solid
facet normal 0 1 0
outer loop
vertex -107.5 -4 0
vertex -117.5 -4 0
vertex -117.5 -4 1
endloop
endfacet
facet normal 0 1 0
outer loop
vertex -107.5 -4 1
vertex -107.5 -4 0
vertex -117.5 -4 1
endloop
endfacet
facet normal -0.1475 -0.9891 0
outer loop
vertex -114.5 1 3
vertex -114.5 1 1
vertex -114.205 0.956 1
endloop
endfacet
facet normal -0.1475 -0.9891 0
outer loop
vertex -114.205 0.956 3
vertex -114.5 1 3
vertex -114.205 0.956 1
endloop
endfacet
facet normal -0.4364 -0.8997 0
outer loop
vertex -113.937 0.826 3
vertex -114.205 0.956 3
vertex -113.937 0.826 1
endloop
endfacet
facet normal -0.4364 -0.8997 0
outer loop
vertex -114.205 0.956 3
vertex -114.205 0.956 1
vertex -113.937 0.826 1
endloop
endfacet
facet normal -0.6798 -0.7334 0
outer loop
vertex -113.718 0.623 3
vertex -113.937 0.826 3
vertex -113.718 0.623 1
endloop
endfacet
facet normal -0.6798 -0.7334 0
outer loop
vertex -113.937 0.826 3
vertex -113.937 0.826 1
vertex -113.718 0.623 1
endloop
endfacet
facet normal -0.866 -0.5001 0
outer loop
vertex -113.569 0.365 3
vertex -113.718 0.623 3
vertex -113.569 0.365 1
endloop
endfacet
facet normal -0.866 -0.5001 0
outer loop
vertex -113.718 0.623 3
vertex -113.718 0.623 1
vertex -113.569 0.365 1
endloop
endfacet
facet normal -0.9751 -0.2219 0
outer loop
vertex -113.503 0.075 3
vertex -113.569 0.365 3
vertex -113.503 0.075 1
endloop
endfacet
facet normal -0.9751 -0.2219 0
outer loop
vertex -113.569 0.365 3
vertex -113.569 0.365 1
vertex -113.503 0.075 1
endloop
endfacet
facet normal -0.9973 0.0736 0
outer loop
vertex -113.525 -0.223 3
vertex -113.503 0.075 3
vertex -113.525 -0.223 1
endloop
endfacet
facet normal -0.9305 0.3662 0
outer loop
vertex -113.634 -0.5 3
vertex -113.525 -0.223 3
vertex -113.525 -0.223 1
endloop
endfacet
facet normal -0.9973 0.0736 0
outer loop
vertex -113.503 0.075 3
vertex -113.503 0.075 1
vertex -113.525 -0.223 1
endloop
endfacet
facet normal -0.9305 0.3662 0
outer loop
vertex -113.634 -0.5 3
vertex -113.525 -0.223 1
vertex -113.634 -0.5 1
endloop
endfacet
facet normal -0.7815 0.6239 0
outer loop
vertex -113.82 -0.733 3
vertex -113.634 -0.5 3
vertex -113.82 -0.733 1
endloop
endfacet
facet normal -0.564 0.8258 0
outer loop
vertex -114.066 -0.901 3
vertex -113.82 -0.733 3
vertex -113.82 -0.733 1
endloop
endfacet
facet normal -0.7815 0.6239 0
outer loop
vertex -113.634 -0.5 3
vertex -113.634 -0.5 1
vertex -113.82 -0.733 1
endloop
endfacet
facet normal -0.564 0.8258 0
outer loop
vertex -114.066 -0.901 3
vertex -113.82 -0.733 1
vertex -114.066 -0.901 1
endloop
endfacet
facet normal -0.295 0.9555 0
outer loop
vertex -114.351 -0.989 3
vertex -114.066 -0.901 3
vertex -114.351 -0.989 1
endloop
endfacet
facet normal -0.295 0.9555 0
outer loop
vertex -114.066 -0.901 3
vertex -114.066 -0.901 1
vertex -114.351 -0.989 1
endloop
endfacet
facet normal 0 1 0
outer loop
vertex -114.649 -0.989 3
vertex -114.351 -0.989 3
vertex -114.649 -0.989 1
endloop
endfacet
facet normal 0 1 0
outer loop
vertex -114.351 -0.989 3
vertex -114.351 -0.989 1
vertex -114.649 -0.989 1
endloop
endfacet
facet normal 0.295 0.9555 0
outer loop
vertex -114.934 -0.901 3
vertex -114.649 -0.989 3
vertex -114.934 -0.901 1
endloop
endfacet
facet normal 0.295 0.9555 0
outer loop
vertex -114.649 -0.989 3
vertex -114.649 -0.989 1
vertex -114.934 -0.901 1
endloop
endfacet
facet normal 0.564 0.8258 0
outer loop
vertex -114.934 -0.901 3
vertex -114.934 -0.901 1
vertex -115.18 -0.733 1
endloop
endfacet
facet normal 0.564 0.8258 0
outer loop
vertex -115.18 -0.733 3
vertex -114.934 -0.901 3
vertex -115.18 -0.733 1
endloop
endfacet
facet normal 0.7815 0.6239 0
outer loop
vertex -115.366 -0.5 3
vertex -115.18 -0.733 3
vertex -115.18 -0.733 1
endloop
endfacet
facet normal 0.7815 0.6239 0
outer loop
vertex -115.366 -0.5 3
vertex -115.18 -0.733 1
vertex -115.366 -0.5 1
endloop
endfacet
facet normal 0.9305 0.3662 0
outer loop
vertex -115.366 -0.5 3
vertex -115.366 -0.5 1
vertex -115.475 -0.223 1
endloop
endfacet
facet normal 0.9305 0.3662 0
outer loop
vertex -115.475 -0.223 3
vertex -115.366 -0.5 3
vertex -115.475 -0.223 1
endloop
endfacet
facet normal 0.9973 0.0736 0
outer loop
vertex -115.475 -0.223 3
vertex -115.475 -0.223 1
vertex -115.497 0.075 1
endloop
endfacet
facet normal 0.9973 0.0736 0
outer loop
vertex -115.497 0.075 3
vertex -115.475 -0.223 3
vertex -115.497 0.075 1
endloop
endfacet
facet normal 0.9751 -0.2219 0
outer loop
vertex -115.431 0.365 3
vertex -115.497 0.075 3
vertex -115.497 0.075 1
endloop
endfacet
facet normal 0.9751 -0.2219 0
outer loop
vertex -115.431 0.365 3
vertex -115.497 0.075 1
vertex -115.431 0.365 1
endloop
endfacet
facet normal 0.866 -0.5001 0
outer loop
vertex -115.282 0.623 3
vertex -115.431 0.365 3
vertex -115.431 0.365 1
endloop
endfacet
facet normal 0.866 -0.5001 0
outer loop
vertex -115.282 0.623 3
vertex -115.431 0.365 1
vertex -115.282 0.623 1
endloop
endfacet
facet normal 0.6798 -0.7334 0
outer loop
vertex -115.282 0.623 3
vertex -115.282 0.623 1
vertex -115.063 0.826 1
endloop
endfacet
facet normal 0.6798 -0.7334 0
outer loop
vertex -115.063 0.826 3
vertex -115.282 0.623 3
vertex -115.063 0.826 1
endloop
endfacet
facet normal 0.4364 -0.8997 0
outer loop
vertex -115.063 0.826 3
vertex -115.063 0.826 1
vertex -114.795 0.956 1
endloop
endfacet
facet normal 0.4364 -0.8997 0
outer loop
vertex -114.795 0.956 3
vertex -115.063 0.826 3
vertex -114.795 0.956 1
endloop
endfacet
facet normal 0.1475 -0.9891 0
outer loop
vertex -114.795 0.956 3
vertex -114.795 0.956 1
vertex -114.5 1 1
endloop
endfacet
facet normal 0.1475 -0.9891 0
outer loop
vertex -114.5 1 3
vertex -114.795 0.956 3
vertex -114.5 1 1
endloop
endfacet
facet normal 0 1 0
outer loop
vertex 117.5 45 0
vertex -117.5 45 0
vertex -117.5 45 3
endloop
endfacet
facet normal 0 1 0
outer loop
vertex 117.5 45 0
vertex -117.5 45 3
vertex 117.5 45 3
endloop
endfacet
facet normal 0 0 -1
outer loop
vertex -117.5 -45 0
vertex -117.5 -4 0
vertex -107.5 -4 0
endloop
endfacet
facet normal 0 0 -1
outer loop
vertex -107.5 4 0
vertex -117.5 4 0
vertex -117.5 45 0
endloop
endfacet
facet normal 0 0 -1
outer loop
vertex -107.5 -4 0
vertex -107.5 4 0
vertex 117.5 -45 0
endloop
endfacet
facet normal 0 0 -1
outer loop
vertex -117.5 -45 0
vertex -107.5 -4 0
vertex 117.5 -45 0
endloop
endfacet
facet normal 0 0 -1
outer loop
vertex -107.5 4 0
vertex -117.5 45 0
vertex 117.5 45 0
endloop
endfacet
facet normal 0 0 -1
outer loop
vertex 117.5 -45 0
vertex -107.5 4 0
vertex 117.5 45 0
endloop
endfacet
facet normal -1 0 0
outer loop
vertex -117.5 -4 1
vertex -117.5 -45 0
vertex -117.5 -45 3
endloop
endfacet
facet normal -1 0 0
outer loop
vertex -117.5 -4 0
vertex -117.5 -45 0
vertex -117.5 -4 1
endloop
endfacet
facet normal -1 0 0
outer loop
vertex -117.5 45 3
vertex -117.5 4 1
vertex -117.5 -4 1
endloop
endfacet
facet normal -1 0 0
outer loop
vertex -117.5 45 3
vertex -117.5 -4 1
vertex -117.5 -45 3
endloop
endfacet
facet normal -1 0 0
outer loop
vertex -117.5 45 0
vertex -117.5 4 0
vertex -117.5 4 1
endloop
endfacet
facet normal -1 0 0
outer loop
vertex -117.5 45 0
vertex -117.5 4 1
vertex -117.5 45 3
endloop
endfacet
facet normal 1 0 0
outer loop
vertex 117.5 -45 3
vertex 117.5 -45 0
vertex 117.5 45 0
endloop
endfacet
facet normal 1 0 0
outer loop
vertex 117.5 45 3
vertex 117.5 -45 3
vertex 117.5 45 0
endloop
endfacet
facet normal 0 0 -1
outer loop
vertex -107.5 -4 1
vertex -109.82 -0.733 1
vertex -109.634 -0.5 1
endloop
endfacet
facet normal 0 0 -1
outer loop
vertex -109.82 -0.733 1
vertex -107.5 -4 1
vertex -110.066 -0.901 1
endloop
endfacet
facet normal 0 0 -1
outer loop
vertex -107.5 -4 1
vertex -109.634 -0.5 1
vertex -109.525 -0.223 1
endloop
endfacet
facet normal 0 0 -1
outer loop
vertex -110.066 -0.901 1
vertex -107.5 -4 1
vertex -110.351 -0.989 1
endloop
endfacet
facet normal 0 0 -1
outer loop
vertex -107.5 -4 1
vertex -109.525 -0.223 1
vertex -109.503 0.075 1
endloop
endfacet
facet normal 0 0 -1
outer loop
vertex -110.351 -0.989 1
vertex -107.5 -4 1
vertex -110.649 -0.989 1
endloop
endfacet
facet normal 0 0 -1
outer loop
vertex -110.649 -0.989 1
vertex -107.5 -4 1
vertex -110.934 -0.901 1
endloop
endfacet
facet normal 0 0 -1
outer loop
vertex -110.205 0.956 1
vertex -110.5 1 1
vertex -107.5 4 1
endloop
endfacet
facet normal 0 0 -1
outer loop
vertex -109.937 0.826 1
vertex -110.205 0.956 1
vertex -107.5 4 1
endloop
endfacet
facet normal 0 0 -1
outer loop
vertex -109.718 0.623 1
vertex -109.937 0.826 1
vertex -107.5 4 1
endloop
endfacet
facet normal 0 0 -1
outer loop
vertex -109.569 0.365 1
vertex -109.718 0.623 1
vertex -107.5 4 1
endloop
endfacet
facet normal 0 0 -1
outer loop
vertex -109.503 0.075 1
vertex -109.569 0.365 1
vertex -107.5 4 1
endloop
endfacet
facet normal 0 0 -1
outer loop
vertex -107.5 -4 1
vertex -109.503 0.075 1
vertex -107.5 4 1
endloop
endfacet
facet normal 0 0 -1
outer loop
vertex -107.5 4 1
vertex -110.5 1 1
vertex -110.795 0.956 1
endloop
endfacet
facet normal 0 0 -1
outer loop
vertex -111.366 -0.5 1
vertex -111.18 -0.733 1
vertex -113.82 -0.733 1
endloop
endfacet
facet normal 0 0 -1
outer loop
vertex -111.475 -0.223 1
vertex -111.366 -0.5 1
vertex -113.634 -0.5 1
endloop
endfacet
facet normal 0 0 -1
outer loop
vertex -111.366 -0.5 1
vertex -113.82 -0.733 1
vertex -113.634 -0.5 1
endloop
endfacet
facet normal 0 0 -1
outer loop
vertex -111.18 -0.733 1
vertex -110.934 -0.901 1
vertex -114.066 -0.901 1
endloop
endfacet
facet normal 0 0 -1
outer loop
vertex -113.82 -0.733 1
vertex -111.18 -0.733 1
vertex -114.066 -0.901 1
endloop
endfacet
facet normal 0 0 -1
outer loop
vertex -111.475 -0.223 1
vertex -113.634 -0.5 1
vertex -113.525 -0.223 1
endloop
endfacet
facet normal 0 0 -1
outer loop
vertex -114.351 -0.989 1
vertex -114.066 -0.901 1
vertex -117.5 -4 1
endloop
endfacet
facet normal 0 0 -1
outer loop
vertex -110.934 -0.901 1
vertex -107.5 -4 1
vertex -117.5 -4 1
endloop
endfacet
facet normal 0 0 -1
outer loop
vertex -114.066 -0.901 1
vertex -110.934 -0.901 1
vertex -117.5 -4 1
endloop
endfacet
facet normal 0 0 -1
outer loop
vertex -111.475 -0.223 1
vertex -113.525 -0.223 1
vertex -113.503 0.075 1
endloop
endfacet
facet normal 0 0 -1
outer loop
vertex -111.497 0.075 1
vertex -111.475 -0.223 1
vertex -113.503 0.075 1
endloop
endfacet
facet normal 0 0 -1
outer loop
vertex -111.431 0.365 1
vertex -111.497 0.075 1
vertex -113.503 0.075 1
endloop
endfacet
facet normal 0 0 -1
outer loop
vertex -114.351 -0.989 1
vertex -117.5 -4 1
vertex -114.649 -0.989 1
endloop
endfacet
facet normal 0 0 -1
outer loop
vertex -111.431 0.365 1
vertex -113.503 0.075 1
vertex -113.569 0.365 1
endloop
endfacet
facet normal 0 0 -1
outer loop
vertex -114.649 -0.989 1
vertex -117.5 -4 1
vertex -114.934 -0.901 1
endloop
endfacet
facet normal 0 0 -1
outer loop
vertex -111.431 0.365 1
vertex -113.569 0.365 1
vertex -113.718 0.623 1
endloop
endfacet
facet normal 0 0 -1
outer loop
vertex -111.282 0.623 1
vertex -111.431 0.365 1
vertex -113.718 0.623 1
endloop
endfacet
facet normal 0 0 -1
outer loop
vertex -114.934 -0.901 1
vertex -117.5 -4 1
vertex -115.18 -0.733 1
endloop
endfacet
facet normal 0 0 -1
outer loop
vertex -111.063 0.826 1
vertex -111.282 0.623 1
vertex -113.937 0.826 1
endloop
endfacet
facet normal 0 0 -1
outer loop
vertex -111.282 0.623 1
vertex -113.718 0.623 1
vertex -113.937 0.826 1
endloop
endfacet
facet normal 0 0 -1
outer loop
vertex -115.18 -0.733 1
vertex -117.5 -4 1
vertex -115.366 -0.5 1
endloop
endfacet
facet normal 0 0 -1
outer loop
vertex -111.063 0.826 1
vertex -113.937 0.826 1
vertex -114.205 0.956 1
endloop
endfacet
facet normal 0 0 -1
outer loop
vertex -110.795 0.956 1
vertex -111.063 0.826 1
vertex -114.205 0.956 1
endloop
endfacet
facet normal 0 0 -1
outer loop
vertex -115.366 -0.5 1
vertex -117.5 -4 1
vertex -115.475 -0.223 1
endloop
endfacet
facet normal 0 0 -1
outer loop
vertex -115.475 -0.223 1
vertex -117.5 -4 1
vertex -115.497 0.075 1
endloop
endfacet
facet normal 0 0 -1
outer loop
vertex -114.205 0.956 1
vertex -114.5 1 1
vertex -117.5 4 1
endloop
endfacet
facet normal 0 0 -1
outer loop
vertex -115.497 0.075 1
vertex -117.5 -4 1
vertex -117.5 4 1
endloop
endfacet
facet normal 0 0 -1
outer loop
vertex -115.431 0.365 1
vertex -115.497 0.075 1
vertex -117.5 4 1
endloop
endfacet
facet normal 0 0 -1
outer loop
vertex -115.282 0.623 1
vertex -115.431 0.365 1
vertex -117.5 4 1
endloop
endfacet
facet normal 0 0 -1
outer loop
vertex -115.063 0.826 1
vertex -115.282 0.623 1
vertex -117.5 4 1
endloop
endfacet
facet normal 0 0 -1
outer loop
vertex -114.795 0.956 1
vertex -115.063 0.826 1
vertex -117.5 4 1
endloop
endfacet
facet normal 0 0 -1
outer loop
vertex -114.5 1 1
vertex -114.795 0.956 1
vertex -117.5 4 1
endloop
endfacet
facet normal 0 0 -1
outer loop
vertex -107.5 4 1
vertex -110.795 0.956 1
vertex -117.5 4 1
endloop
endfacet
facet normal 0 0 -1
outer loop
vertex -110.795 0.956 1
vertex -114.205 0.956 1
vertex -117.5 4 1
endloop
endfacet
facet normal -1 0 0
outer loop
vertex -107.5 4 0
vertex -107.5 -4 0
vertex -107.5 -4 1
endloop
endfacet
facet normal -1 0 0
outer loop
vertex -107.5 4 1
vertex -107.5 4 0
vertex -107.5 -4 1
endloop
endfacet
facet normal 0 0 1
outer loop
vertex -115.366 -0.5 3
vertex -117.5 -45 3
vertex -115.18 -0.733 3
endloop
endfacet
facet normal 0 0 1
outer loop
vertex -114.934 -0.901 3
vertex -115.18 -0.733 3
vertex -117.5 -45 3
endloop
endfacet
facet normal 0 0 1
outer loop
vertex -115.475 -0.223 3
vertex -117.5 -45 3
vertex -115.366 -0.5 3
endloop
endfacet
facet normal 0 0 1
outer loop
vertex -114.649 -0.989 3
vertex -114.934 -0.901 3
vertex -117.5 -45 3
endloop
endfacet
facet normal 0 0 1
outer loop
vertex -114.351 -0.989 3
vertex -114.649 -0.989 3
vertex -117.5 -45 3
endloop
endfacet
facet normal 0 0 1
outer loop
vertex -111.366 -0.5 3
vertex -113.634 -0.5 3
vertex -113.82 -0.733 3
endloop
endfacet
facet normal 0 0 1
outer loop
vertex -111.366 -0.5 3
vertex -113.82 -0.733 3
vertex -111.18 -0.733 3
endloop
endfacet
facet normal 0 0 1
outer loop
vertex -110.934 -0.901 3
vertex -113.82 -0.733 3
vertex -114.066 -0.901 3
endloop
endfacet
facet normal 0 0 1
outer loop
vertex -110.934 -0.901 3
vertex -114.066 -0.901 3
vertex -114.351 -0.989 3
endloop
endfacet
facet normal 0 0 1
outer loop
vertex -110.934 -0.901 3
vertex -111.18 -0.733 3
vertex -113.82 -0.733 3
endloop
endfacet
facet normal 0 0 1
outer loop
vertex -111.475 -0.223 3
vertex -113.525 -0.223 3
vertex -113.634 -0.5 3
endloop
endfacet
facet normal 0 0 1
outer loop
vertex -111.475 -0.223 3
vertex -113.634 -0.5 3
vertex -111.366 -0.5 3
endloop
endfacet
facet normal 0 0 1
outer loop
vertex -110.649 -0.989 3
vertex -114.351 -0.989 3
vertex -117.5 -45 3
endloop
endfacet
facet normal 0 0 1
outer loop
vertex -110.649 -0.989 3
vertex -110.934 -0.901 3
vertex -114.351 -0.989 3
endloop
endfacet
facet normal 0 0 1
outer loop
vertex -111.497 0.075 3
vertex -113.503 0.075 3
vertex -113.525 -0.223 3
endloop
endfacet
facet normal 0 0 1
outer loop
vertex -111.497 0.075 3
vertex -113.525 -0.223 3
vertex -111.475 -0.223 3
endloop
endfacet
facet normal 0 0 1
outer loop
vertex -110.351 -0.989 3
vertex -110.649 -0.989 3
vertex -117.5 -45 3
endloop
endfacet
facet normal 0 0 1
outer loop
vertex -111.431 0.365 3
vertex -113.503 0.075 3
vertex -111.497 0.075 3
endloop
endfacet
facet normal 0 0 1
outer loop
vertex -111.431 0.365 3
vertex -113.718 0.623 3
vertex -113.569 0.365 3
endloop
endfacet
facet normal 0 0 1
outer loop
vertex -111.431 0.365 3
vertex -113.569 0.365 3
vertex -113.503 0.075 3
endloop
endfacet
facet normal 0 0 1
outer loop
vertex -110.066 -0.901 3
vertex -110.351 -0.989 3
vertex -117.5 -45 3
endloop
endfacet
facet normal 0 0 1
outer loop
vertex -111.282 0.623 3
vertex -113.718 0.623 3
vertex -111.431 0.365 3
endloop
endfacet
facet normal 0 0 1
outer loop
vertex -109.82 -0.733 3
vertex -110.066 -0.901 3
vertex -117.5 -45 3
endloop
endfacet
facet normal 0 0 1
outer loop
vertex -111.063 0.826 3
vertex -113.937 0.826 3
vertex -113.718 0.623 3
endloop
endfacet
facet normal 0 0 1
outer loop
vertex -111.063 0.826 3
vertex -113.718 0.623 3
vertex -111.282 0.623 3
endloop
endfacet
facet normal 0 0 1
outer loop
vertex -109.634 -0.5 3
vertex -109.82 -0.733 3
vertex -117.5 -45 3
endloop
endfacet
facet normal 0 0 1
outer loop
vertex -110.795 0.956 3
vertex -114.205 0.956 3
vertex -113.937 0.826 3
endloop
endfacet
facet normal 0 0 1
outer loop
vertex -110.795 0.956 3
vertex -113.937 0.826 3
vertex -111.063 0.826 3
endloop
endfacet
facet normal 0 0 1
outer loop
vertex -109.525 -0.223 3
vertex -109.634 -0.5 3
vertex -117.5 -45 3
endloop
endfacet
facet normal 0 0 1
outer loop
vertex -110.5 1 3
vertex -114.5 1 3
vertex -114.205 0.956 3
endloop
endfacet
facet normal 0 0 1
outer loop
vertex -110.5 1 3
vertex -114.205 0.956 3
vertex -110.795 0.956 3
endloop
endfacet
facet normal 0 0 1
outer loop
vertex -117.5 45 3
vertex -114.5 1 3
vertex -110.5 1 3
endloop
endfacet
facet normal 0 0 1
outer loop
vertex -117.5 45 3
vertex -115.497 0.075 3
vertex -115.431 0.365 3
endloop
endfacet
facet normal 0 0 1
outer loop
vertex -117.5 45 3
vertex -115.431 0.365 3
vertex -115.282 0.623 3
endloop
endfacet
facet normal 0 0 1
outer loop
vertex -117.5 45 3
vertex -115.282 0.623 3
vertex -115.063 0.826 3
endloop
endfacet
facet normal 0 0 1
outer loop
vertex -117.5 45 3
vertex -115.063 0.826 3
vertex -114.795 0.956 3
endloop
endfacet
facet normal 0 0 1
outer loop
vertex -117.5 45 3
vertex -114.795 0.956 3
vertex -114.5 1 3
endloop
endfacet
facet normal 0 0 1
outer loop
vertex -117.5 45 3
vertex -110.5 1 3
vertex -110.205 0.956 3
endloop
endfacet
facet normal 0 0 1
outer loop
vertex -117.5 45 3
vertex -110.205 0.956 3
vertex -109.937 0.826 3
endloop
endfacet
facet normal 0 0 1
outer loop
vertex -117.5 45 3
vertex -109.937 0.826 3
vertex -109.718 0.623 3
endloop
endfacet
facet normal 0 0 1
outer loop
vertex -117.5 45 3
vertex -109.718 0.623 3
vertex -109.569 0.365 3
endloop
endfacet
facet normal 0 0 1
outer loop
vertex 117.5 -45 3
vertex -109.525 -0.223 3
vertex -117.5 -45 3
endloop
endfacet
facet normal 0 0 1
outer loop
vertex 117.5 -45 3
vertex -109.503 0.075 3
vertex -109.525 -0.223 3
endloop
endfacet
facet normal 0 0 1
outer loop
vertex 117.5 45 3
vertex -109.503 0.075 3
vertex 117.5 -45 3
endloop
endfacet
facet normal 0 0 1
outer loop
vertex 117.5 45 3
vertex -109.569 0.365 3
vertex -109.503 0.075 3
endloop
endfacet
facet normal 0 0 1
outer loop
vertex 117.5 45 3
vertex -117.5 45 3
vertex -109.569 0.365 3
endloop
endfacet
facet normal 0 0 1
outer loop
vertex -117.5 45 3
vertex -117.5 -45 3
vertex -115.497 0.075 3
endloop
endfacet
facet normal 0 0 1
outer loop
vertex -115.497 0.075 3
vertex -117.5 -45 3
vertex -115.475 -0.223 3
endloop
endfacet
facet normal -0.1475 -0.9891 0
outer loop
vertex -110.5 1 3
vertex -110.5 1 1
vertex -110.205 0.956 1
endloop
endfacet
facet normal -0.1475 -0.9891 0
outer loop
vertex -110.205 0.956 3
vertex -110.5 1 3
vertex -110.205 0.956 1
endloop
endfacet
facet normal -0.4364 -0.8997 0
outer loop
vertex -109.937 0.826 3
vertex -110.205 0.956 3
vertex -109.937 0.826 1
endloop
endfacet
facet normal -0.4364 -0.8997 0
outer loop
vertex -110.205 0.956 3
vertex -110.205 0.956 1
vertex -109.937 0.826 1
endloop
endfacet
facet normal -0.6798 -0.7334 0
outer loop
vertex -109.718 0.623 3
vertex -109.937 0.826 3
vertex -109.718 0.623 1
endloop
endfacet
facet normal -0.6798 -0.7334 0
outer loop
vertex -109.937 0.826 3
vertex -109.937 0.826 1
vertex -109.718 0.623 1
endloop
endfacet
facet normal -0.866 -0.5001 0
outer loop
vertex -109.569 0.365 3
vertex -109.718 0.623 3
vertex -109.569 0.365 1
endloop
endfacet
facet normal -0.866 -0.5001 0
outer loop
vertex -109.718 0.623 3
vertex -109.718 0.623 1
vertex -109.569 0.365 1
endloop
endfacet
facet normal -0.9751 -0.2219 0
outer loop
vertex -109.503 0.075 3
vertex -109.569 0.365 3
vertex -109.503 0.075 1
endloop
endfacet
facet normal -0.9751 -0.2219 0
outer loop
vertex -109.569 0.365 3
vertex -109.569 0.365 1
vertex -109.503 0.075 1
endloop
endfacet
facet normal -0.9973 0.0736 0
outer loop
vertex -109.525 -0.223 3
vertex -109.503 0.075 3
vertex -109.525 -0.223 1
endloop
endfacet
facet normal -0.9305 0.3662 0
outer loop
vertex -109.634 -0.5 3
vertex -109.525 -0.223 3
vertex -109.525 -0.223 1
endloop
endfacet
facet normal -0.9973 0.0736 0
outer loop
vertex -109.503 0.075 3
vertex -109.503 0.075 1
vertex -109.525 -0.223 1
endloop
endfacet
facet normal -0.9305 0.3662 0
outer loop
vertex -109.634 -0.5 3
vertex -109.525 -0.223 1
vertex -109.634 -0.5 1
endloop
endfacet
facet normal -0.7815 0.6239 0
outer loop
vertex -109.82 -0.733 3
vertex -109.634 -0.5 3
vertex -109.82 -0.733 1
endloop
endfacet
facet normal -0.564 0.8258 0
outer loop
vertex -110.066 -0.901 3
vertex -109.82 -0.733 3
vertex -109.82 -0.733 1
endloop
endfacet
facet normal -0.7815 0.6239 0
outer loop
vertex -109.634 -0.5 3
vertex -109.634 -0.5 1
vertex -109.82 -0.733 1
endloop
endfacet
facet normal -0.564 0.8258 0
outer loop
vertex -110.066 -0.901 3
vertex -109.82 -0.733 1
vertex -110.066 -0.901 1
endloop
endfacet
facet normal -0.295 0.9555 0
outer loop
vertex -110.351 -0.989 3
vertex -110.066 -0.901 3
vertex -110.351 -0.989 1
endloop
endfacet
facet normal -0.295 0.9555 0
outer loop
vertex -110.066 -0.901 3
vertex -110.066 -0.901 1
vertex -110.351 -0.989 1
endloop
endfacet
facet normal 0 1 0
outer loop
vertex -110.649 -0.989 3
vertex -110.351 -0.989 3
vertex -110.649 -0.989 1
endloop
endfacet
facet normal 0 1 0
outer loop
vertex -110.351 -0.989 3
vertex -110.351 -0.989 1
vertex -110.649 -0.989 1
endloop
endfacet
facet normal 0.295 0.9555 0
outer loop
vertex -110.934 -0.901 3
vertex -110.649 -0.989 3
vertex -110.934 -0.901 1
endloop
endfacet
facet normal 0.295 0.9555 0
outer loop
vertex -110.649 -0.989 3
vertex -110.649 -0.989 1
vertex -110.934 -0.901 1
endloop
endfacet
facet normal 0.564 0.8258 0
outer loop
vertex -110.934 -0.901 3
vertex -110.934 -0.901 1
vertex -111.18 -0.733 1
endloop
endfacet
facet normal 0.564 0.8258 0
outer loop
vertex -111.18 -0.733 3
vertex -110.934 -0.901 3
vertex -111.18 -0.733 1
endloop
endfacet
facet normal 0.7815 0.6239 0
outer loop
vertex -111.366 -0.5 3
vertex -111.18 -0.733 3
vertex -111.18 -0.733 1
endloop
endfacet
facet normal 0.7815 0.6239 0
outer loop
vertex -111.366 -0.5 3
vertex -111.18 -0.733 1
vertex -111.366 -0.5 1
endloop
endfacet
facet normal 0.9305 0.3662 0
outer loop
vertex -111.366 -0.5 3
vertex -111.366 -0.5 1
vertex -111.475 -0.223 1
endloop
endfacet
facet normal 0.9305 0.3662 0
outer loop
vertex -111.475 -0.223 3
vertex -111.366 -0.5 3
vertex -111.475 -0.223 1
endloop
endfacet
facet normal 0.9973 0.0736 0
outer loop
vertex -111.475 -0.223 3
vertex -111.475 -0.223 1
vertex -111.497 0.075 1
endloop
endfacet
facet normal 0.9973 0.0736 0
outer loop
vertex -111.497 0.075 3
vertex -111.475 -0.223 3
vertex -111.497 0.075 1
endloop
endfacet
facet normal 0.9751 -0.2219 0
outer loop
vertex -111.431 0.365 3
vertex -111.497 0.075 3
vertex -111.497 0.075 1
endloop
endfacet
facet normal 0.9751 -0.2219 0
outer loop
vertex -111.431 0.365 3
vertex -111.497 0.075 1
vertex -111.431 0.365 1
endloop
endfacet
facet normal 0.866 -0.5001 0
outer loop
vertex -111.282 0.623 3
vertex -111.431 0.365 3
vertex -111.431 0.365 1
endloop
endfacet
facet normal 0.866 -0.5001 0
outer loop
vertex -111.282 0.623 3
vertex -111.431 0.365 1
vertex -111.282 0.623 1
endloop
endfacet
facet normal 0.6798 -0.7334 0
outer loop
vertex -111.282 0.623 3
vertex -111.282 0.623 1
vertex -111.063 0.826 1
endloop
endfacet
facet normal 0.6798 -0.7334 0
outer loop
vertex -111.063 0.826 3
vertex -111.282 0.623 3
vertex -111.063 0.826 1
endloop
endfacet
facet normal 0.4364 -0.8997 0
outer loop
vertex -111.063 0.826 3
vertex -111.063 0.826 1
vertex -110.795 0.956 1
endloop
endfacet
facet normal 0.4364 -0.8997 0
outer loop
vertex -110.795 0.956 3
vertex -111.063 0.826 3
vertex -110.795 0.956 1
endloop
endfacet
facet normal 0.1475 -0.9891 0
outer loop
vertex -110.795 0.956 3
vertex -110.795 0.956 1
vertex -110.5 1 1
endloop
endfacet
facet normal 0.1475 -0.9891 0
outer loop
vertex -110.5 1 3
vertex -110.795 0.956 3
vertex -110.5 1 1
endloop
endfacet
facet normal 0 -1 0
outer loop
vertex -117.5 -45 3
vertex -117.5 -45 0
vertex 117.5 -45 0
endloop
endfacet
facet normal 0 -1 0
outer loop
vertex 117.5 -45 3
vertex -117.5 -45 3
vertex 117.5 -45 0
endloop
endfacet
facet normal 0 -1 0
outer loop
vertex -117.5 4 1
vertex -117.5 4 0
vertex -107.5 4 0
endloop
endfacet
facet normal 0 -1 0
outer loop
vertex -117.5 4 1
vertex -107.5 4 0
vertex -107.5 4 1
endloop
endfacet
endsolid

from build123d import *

# Parameters (mm, degrees)
SKETCH_1_W          = 235
SKETCH_1_H          = 90
EXTRUDE_1_DEPTH     = 3
SKETCH_2_W          = 1
SKETCH_2_H          = 8
CUT_EXTRUDE_1_DEPTH = 10
SKETCH_3_R          = 1
CUT_EXTRUDE_2_DEPTH = 10


with BuildPart() as part:
    # 草图1 → 凸台-拉伸1 (new body)
    with BuildSketch(Plane.XY):
        Rectangle(SKETCH_1_W, SKETCH_1_H)
    extrude(amount=EXTRUDE_1_DEPTH)

    # 草图2 → 切除-拉伸1 (cut)
    with BuildSketch(Plane.ZY.offset(117.5)):
        with Locations((0.5, 0)):
            Rectangle(SKETCH_2_W, SKETCH_2_H)
    extrude(amount=-CUT_EXTRUDE_1_DEPTH, mode=Mode.SUBTRACT)

    # 草图3 → 切除-拉伸2 (cut)
    with BuildSketch(Plane(origin=(0, 0, 1), x_dir=(-1, 0, 0), z_dir=(0, 0, -1))):
        with Locations(Location((110.5, 0, 0), (0, 0, 90))):
            Circle(SKETCH_3_R)
        with Locations(Location((114.5, 0, 0), (0, 0, 90))):
            Circle(SKETCH_3_R)
    extrude(amount=-CUT_EXTRUDE_2_DEPTH, mode=Mode.SUBTRACT)


solid = part.part
